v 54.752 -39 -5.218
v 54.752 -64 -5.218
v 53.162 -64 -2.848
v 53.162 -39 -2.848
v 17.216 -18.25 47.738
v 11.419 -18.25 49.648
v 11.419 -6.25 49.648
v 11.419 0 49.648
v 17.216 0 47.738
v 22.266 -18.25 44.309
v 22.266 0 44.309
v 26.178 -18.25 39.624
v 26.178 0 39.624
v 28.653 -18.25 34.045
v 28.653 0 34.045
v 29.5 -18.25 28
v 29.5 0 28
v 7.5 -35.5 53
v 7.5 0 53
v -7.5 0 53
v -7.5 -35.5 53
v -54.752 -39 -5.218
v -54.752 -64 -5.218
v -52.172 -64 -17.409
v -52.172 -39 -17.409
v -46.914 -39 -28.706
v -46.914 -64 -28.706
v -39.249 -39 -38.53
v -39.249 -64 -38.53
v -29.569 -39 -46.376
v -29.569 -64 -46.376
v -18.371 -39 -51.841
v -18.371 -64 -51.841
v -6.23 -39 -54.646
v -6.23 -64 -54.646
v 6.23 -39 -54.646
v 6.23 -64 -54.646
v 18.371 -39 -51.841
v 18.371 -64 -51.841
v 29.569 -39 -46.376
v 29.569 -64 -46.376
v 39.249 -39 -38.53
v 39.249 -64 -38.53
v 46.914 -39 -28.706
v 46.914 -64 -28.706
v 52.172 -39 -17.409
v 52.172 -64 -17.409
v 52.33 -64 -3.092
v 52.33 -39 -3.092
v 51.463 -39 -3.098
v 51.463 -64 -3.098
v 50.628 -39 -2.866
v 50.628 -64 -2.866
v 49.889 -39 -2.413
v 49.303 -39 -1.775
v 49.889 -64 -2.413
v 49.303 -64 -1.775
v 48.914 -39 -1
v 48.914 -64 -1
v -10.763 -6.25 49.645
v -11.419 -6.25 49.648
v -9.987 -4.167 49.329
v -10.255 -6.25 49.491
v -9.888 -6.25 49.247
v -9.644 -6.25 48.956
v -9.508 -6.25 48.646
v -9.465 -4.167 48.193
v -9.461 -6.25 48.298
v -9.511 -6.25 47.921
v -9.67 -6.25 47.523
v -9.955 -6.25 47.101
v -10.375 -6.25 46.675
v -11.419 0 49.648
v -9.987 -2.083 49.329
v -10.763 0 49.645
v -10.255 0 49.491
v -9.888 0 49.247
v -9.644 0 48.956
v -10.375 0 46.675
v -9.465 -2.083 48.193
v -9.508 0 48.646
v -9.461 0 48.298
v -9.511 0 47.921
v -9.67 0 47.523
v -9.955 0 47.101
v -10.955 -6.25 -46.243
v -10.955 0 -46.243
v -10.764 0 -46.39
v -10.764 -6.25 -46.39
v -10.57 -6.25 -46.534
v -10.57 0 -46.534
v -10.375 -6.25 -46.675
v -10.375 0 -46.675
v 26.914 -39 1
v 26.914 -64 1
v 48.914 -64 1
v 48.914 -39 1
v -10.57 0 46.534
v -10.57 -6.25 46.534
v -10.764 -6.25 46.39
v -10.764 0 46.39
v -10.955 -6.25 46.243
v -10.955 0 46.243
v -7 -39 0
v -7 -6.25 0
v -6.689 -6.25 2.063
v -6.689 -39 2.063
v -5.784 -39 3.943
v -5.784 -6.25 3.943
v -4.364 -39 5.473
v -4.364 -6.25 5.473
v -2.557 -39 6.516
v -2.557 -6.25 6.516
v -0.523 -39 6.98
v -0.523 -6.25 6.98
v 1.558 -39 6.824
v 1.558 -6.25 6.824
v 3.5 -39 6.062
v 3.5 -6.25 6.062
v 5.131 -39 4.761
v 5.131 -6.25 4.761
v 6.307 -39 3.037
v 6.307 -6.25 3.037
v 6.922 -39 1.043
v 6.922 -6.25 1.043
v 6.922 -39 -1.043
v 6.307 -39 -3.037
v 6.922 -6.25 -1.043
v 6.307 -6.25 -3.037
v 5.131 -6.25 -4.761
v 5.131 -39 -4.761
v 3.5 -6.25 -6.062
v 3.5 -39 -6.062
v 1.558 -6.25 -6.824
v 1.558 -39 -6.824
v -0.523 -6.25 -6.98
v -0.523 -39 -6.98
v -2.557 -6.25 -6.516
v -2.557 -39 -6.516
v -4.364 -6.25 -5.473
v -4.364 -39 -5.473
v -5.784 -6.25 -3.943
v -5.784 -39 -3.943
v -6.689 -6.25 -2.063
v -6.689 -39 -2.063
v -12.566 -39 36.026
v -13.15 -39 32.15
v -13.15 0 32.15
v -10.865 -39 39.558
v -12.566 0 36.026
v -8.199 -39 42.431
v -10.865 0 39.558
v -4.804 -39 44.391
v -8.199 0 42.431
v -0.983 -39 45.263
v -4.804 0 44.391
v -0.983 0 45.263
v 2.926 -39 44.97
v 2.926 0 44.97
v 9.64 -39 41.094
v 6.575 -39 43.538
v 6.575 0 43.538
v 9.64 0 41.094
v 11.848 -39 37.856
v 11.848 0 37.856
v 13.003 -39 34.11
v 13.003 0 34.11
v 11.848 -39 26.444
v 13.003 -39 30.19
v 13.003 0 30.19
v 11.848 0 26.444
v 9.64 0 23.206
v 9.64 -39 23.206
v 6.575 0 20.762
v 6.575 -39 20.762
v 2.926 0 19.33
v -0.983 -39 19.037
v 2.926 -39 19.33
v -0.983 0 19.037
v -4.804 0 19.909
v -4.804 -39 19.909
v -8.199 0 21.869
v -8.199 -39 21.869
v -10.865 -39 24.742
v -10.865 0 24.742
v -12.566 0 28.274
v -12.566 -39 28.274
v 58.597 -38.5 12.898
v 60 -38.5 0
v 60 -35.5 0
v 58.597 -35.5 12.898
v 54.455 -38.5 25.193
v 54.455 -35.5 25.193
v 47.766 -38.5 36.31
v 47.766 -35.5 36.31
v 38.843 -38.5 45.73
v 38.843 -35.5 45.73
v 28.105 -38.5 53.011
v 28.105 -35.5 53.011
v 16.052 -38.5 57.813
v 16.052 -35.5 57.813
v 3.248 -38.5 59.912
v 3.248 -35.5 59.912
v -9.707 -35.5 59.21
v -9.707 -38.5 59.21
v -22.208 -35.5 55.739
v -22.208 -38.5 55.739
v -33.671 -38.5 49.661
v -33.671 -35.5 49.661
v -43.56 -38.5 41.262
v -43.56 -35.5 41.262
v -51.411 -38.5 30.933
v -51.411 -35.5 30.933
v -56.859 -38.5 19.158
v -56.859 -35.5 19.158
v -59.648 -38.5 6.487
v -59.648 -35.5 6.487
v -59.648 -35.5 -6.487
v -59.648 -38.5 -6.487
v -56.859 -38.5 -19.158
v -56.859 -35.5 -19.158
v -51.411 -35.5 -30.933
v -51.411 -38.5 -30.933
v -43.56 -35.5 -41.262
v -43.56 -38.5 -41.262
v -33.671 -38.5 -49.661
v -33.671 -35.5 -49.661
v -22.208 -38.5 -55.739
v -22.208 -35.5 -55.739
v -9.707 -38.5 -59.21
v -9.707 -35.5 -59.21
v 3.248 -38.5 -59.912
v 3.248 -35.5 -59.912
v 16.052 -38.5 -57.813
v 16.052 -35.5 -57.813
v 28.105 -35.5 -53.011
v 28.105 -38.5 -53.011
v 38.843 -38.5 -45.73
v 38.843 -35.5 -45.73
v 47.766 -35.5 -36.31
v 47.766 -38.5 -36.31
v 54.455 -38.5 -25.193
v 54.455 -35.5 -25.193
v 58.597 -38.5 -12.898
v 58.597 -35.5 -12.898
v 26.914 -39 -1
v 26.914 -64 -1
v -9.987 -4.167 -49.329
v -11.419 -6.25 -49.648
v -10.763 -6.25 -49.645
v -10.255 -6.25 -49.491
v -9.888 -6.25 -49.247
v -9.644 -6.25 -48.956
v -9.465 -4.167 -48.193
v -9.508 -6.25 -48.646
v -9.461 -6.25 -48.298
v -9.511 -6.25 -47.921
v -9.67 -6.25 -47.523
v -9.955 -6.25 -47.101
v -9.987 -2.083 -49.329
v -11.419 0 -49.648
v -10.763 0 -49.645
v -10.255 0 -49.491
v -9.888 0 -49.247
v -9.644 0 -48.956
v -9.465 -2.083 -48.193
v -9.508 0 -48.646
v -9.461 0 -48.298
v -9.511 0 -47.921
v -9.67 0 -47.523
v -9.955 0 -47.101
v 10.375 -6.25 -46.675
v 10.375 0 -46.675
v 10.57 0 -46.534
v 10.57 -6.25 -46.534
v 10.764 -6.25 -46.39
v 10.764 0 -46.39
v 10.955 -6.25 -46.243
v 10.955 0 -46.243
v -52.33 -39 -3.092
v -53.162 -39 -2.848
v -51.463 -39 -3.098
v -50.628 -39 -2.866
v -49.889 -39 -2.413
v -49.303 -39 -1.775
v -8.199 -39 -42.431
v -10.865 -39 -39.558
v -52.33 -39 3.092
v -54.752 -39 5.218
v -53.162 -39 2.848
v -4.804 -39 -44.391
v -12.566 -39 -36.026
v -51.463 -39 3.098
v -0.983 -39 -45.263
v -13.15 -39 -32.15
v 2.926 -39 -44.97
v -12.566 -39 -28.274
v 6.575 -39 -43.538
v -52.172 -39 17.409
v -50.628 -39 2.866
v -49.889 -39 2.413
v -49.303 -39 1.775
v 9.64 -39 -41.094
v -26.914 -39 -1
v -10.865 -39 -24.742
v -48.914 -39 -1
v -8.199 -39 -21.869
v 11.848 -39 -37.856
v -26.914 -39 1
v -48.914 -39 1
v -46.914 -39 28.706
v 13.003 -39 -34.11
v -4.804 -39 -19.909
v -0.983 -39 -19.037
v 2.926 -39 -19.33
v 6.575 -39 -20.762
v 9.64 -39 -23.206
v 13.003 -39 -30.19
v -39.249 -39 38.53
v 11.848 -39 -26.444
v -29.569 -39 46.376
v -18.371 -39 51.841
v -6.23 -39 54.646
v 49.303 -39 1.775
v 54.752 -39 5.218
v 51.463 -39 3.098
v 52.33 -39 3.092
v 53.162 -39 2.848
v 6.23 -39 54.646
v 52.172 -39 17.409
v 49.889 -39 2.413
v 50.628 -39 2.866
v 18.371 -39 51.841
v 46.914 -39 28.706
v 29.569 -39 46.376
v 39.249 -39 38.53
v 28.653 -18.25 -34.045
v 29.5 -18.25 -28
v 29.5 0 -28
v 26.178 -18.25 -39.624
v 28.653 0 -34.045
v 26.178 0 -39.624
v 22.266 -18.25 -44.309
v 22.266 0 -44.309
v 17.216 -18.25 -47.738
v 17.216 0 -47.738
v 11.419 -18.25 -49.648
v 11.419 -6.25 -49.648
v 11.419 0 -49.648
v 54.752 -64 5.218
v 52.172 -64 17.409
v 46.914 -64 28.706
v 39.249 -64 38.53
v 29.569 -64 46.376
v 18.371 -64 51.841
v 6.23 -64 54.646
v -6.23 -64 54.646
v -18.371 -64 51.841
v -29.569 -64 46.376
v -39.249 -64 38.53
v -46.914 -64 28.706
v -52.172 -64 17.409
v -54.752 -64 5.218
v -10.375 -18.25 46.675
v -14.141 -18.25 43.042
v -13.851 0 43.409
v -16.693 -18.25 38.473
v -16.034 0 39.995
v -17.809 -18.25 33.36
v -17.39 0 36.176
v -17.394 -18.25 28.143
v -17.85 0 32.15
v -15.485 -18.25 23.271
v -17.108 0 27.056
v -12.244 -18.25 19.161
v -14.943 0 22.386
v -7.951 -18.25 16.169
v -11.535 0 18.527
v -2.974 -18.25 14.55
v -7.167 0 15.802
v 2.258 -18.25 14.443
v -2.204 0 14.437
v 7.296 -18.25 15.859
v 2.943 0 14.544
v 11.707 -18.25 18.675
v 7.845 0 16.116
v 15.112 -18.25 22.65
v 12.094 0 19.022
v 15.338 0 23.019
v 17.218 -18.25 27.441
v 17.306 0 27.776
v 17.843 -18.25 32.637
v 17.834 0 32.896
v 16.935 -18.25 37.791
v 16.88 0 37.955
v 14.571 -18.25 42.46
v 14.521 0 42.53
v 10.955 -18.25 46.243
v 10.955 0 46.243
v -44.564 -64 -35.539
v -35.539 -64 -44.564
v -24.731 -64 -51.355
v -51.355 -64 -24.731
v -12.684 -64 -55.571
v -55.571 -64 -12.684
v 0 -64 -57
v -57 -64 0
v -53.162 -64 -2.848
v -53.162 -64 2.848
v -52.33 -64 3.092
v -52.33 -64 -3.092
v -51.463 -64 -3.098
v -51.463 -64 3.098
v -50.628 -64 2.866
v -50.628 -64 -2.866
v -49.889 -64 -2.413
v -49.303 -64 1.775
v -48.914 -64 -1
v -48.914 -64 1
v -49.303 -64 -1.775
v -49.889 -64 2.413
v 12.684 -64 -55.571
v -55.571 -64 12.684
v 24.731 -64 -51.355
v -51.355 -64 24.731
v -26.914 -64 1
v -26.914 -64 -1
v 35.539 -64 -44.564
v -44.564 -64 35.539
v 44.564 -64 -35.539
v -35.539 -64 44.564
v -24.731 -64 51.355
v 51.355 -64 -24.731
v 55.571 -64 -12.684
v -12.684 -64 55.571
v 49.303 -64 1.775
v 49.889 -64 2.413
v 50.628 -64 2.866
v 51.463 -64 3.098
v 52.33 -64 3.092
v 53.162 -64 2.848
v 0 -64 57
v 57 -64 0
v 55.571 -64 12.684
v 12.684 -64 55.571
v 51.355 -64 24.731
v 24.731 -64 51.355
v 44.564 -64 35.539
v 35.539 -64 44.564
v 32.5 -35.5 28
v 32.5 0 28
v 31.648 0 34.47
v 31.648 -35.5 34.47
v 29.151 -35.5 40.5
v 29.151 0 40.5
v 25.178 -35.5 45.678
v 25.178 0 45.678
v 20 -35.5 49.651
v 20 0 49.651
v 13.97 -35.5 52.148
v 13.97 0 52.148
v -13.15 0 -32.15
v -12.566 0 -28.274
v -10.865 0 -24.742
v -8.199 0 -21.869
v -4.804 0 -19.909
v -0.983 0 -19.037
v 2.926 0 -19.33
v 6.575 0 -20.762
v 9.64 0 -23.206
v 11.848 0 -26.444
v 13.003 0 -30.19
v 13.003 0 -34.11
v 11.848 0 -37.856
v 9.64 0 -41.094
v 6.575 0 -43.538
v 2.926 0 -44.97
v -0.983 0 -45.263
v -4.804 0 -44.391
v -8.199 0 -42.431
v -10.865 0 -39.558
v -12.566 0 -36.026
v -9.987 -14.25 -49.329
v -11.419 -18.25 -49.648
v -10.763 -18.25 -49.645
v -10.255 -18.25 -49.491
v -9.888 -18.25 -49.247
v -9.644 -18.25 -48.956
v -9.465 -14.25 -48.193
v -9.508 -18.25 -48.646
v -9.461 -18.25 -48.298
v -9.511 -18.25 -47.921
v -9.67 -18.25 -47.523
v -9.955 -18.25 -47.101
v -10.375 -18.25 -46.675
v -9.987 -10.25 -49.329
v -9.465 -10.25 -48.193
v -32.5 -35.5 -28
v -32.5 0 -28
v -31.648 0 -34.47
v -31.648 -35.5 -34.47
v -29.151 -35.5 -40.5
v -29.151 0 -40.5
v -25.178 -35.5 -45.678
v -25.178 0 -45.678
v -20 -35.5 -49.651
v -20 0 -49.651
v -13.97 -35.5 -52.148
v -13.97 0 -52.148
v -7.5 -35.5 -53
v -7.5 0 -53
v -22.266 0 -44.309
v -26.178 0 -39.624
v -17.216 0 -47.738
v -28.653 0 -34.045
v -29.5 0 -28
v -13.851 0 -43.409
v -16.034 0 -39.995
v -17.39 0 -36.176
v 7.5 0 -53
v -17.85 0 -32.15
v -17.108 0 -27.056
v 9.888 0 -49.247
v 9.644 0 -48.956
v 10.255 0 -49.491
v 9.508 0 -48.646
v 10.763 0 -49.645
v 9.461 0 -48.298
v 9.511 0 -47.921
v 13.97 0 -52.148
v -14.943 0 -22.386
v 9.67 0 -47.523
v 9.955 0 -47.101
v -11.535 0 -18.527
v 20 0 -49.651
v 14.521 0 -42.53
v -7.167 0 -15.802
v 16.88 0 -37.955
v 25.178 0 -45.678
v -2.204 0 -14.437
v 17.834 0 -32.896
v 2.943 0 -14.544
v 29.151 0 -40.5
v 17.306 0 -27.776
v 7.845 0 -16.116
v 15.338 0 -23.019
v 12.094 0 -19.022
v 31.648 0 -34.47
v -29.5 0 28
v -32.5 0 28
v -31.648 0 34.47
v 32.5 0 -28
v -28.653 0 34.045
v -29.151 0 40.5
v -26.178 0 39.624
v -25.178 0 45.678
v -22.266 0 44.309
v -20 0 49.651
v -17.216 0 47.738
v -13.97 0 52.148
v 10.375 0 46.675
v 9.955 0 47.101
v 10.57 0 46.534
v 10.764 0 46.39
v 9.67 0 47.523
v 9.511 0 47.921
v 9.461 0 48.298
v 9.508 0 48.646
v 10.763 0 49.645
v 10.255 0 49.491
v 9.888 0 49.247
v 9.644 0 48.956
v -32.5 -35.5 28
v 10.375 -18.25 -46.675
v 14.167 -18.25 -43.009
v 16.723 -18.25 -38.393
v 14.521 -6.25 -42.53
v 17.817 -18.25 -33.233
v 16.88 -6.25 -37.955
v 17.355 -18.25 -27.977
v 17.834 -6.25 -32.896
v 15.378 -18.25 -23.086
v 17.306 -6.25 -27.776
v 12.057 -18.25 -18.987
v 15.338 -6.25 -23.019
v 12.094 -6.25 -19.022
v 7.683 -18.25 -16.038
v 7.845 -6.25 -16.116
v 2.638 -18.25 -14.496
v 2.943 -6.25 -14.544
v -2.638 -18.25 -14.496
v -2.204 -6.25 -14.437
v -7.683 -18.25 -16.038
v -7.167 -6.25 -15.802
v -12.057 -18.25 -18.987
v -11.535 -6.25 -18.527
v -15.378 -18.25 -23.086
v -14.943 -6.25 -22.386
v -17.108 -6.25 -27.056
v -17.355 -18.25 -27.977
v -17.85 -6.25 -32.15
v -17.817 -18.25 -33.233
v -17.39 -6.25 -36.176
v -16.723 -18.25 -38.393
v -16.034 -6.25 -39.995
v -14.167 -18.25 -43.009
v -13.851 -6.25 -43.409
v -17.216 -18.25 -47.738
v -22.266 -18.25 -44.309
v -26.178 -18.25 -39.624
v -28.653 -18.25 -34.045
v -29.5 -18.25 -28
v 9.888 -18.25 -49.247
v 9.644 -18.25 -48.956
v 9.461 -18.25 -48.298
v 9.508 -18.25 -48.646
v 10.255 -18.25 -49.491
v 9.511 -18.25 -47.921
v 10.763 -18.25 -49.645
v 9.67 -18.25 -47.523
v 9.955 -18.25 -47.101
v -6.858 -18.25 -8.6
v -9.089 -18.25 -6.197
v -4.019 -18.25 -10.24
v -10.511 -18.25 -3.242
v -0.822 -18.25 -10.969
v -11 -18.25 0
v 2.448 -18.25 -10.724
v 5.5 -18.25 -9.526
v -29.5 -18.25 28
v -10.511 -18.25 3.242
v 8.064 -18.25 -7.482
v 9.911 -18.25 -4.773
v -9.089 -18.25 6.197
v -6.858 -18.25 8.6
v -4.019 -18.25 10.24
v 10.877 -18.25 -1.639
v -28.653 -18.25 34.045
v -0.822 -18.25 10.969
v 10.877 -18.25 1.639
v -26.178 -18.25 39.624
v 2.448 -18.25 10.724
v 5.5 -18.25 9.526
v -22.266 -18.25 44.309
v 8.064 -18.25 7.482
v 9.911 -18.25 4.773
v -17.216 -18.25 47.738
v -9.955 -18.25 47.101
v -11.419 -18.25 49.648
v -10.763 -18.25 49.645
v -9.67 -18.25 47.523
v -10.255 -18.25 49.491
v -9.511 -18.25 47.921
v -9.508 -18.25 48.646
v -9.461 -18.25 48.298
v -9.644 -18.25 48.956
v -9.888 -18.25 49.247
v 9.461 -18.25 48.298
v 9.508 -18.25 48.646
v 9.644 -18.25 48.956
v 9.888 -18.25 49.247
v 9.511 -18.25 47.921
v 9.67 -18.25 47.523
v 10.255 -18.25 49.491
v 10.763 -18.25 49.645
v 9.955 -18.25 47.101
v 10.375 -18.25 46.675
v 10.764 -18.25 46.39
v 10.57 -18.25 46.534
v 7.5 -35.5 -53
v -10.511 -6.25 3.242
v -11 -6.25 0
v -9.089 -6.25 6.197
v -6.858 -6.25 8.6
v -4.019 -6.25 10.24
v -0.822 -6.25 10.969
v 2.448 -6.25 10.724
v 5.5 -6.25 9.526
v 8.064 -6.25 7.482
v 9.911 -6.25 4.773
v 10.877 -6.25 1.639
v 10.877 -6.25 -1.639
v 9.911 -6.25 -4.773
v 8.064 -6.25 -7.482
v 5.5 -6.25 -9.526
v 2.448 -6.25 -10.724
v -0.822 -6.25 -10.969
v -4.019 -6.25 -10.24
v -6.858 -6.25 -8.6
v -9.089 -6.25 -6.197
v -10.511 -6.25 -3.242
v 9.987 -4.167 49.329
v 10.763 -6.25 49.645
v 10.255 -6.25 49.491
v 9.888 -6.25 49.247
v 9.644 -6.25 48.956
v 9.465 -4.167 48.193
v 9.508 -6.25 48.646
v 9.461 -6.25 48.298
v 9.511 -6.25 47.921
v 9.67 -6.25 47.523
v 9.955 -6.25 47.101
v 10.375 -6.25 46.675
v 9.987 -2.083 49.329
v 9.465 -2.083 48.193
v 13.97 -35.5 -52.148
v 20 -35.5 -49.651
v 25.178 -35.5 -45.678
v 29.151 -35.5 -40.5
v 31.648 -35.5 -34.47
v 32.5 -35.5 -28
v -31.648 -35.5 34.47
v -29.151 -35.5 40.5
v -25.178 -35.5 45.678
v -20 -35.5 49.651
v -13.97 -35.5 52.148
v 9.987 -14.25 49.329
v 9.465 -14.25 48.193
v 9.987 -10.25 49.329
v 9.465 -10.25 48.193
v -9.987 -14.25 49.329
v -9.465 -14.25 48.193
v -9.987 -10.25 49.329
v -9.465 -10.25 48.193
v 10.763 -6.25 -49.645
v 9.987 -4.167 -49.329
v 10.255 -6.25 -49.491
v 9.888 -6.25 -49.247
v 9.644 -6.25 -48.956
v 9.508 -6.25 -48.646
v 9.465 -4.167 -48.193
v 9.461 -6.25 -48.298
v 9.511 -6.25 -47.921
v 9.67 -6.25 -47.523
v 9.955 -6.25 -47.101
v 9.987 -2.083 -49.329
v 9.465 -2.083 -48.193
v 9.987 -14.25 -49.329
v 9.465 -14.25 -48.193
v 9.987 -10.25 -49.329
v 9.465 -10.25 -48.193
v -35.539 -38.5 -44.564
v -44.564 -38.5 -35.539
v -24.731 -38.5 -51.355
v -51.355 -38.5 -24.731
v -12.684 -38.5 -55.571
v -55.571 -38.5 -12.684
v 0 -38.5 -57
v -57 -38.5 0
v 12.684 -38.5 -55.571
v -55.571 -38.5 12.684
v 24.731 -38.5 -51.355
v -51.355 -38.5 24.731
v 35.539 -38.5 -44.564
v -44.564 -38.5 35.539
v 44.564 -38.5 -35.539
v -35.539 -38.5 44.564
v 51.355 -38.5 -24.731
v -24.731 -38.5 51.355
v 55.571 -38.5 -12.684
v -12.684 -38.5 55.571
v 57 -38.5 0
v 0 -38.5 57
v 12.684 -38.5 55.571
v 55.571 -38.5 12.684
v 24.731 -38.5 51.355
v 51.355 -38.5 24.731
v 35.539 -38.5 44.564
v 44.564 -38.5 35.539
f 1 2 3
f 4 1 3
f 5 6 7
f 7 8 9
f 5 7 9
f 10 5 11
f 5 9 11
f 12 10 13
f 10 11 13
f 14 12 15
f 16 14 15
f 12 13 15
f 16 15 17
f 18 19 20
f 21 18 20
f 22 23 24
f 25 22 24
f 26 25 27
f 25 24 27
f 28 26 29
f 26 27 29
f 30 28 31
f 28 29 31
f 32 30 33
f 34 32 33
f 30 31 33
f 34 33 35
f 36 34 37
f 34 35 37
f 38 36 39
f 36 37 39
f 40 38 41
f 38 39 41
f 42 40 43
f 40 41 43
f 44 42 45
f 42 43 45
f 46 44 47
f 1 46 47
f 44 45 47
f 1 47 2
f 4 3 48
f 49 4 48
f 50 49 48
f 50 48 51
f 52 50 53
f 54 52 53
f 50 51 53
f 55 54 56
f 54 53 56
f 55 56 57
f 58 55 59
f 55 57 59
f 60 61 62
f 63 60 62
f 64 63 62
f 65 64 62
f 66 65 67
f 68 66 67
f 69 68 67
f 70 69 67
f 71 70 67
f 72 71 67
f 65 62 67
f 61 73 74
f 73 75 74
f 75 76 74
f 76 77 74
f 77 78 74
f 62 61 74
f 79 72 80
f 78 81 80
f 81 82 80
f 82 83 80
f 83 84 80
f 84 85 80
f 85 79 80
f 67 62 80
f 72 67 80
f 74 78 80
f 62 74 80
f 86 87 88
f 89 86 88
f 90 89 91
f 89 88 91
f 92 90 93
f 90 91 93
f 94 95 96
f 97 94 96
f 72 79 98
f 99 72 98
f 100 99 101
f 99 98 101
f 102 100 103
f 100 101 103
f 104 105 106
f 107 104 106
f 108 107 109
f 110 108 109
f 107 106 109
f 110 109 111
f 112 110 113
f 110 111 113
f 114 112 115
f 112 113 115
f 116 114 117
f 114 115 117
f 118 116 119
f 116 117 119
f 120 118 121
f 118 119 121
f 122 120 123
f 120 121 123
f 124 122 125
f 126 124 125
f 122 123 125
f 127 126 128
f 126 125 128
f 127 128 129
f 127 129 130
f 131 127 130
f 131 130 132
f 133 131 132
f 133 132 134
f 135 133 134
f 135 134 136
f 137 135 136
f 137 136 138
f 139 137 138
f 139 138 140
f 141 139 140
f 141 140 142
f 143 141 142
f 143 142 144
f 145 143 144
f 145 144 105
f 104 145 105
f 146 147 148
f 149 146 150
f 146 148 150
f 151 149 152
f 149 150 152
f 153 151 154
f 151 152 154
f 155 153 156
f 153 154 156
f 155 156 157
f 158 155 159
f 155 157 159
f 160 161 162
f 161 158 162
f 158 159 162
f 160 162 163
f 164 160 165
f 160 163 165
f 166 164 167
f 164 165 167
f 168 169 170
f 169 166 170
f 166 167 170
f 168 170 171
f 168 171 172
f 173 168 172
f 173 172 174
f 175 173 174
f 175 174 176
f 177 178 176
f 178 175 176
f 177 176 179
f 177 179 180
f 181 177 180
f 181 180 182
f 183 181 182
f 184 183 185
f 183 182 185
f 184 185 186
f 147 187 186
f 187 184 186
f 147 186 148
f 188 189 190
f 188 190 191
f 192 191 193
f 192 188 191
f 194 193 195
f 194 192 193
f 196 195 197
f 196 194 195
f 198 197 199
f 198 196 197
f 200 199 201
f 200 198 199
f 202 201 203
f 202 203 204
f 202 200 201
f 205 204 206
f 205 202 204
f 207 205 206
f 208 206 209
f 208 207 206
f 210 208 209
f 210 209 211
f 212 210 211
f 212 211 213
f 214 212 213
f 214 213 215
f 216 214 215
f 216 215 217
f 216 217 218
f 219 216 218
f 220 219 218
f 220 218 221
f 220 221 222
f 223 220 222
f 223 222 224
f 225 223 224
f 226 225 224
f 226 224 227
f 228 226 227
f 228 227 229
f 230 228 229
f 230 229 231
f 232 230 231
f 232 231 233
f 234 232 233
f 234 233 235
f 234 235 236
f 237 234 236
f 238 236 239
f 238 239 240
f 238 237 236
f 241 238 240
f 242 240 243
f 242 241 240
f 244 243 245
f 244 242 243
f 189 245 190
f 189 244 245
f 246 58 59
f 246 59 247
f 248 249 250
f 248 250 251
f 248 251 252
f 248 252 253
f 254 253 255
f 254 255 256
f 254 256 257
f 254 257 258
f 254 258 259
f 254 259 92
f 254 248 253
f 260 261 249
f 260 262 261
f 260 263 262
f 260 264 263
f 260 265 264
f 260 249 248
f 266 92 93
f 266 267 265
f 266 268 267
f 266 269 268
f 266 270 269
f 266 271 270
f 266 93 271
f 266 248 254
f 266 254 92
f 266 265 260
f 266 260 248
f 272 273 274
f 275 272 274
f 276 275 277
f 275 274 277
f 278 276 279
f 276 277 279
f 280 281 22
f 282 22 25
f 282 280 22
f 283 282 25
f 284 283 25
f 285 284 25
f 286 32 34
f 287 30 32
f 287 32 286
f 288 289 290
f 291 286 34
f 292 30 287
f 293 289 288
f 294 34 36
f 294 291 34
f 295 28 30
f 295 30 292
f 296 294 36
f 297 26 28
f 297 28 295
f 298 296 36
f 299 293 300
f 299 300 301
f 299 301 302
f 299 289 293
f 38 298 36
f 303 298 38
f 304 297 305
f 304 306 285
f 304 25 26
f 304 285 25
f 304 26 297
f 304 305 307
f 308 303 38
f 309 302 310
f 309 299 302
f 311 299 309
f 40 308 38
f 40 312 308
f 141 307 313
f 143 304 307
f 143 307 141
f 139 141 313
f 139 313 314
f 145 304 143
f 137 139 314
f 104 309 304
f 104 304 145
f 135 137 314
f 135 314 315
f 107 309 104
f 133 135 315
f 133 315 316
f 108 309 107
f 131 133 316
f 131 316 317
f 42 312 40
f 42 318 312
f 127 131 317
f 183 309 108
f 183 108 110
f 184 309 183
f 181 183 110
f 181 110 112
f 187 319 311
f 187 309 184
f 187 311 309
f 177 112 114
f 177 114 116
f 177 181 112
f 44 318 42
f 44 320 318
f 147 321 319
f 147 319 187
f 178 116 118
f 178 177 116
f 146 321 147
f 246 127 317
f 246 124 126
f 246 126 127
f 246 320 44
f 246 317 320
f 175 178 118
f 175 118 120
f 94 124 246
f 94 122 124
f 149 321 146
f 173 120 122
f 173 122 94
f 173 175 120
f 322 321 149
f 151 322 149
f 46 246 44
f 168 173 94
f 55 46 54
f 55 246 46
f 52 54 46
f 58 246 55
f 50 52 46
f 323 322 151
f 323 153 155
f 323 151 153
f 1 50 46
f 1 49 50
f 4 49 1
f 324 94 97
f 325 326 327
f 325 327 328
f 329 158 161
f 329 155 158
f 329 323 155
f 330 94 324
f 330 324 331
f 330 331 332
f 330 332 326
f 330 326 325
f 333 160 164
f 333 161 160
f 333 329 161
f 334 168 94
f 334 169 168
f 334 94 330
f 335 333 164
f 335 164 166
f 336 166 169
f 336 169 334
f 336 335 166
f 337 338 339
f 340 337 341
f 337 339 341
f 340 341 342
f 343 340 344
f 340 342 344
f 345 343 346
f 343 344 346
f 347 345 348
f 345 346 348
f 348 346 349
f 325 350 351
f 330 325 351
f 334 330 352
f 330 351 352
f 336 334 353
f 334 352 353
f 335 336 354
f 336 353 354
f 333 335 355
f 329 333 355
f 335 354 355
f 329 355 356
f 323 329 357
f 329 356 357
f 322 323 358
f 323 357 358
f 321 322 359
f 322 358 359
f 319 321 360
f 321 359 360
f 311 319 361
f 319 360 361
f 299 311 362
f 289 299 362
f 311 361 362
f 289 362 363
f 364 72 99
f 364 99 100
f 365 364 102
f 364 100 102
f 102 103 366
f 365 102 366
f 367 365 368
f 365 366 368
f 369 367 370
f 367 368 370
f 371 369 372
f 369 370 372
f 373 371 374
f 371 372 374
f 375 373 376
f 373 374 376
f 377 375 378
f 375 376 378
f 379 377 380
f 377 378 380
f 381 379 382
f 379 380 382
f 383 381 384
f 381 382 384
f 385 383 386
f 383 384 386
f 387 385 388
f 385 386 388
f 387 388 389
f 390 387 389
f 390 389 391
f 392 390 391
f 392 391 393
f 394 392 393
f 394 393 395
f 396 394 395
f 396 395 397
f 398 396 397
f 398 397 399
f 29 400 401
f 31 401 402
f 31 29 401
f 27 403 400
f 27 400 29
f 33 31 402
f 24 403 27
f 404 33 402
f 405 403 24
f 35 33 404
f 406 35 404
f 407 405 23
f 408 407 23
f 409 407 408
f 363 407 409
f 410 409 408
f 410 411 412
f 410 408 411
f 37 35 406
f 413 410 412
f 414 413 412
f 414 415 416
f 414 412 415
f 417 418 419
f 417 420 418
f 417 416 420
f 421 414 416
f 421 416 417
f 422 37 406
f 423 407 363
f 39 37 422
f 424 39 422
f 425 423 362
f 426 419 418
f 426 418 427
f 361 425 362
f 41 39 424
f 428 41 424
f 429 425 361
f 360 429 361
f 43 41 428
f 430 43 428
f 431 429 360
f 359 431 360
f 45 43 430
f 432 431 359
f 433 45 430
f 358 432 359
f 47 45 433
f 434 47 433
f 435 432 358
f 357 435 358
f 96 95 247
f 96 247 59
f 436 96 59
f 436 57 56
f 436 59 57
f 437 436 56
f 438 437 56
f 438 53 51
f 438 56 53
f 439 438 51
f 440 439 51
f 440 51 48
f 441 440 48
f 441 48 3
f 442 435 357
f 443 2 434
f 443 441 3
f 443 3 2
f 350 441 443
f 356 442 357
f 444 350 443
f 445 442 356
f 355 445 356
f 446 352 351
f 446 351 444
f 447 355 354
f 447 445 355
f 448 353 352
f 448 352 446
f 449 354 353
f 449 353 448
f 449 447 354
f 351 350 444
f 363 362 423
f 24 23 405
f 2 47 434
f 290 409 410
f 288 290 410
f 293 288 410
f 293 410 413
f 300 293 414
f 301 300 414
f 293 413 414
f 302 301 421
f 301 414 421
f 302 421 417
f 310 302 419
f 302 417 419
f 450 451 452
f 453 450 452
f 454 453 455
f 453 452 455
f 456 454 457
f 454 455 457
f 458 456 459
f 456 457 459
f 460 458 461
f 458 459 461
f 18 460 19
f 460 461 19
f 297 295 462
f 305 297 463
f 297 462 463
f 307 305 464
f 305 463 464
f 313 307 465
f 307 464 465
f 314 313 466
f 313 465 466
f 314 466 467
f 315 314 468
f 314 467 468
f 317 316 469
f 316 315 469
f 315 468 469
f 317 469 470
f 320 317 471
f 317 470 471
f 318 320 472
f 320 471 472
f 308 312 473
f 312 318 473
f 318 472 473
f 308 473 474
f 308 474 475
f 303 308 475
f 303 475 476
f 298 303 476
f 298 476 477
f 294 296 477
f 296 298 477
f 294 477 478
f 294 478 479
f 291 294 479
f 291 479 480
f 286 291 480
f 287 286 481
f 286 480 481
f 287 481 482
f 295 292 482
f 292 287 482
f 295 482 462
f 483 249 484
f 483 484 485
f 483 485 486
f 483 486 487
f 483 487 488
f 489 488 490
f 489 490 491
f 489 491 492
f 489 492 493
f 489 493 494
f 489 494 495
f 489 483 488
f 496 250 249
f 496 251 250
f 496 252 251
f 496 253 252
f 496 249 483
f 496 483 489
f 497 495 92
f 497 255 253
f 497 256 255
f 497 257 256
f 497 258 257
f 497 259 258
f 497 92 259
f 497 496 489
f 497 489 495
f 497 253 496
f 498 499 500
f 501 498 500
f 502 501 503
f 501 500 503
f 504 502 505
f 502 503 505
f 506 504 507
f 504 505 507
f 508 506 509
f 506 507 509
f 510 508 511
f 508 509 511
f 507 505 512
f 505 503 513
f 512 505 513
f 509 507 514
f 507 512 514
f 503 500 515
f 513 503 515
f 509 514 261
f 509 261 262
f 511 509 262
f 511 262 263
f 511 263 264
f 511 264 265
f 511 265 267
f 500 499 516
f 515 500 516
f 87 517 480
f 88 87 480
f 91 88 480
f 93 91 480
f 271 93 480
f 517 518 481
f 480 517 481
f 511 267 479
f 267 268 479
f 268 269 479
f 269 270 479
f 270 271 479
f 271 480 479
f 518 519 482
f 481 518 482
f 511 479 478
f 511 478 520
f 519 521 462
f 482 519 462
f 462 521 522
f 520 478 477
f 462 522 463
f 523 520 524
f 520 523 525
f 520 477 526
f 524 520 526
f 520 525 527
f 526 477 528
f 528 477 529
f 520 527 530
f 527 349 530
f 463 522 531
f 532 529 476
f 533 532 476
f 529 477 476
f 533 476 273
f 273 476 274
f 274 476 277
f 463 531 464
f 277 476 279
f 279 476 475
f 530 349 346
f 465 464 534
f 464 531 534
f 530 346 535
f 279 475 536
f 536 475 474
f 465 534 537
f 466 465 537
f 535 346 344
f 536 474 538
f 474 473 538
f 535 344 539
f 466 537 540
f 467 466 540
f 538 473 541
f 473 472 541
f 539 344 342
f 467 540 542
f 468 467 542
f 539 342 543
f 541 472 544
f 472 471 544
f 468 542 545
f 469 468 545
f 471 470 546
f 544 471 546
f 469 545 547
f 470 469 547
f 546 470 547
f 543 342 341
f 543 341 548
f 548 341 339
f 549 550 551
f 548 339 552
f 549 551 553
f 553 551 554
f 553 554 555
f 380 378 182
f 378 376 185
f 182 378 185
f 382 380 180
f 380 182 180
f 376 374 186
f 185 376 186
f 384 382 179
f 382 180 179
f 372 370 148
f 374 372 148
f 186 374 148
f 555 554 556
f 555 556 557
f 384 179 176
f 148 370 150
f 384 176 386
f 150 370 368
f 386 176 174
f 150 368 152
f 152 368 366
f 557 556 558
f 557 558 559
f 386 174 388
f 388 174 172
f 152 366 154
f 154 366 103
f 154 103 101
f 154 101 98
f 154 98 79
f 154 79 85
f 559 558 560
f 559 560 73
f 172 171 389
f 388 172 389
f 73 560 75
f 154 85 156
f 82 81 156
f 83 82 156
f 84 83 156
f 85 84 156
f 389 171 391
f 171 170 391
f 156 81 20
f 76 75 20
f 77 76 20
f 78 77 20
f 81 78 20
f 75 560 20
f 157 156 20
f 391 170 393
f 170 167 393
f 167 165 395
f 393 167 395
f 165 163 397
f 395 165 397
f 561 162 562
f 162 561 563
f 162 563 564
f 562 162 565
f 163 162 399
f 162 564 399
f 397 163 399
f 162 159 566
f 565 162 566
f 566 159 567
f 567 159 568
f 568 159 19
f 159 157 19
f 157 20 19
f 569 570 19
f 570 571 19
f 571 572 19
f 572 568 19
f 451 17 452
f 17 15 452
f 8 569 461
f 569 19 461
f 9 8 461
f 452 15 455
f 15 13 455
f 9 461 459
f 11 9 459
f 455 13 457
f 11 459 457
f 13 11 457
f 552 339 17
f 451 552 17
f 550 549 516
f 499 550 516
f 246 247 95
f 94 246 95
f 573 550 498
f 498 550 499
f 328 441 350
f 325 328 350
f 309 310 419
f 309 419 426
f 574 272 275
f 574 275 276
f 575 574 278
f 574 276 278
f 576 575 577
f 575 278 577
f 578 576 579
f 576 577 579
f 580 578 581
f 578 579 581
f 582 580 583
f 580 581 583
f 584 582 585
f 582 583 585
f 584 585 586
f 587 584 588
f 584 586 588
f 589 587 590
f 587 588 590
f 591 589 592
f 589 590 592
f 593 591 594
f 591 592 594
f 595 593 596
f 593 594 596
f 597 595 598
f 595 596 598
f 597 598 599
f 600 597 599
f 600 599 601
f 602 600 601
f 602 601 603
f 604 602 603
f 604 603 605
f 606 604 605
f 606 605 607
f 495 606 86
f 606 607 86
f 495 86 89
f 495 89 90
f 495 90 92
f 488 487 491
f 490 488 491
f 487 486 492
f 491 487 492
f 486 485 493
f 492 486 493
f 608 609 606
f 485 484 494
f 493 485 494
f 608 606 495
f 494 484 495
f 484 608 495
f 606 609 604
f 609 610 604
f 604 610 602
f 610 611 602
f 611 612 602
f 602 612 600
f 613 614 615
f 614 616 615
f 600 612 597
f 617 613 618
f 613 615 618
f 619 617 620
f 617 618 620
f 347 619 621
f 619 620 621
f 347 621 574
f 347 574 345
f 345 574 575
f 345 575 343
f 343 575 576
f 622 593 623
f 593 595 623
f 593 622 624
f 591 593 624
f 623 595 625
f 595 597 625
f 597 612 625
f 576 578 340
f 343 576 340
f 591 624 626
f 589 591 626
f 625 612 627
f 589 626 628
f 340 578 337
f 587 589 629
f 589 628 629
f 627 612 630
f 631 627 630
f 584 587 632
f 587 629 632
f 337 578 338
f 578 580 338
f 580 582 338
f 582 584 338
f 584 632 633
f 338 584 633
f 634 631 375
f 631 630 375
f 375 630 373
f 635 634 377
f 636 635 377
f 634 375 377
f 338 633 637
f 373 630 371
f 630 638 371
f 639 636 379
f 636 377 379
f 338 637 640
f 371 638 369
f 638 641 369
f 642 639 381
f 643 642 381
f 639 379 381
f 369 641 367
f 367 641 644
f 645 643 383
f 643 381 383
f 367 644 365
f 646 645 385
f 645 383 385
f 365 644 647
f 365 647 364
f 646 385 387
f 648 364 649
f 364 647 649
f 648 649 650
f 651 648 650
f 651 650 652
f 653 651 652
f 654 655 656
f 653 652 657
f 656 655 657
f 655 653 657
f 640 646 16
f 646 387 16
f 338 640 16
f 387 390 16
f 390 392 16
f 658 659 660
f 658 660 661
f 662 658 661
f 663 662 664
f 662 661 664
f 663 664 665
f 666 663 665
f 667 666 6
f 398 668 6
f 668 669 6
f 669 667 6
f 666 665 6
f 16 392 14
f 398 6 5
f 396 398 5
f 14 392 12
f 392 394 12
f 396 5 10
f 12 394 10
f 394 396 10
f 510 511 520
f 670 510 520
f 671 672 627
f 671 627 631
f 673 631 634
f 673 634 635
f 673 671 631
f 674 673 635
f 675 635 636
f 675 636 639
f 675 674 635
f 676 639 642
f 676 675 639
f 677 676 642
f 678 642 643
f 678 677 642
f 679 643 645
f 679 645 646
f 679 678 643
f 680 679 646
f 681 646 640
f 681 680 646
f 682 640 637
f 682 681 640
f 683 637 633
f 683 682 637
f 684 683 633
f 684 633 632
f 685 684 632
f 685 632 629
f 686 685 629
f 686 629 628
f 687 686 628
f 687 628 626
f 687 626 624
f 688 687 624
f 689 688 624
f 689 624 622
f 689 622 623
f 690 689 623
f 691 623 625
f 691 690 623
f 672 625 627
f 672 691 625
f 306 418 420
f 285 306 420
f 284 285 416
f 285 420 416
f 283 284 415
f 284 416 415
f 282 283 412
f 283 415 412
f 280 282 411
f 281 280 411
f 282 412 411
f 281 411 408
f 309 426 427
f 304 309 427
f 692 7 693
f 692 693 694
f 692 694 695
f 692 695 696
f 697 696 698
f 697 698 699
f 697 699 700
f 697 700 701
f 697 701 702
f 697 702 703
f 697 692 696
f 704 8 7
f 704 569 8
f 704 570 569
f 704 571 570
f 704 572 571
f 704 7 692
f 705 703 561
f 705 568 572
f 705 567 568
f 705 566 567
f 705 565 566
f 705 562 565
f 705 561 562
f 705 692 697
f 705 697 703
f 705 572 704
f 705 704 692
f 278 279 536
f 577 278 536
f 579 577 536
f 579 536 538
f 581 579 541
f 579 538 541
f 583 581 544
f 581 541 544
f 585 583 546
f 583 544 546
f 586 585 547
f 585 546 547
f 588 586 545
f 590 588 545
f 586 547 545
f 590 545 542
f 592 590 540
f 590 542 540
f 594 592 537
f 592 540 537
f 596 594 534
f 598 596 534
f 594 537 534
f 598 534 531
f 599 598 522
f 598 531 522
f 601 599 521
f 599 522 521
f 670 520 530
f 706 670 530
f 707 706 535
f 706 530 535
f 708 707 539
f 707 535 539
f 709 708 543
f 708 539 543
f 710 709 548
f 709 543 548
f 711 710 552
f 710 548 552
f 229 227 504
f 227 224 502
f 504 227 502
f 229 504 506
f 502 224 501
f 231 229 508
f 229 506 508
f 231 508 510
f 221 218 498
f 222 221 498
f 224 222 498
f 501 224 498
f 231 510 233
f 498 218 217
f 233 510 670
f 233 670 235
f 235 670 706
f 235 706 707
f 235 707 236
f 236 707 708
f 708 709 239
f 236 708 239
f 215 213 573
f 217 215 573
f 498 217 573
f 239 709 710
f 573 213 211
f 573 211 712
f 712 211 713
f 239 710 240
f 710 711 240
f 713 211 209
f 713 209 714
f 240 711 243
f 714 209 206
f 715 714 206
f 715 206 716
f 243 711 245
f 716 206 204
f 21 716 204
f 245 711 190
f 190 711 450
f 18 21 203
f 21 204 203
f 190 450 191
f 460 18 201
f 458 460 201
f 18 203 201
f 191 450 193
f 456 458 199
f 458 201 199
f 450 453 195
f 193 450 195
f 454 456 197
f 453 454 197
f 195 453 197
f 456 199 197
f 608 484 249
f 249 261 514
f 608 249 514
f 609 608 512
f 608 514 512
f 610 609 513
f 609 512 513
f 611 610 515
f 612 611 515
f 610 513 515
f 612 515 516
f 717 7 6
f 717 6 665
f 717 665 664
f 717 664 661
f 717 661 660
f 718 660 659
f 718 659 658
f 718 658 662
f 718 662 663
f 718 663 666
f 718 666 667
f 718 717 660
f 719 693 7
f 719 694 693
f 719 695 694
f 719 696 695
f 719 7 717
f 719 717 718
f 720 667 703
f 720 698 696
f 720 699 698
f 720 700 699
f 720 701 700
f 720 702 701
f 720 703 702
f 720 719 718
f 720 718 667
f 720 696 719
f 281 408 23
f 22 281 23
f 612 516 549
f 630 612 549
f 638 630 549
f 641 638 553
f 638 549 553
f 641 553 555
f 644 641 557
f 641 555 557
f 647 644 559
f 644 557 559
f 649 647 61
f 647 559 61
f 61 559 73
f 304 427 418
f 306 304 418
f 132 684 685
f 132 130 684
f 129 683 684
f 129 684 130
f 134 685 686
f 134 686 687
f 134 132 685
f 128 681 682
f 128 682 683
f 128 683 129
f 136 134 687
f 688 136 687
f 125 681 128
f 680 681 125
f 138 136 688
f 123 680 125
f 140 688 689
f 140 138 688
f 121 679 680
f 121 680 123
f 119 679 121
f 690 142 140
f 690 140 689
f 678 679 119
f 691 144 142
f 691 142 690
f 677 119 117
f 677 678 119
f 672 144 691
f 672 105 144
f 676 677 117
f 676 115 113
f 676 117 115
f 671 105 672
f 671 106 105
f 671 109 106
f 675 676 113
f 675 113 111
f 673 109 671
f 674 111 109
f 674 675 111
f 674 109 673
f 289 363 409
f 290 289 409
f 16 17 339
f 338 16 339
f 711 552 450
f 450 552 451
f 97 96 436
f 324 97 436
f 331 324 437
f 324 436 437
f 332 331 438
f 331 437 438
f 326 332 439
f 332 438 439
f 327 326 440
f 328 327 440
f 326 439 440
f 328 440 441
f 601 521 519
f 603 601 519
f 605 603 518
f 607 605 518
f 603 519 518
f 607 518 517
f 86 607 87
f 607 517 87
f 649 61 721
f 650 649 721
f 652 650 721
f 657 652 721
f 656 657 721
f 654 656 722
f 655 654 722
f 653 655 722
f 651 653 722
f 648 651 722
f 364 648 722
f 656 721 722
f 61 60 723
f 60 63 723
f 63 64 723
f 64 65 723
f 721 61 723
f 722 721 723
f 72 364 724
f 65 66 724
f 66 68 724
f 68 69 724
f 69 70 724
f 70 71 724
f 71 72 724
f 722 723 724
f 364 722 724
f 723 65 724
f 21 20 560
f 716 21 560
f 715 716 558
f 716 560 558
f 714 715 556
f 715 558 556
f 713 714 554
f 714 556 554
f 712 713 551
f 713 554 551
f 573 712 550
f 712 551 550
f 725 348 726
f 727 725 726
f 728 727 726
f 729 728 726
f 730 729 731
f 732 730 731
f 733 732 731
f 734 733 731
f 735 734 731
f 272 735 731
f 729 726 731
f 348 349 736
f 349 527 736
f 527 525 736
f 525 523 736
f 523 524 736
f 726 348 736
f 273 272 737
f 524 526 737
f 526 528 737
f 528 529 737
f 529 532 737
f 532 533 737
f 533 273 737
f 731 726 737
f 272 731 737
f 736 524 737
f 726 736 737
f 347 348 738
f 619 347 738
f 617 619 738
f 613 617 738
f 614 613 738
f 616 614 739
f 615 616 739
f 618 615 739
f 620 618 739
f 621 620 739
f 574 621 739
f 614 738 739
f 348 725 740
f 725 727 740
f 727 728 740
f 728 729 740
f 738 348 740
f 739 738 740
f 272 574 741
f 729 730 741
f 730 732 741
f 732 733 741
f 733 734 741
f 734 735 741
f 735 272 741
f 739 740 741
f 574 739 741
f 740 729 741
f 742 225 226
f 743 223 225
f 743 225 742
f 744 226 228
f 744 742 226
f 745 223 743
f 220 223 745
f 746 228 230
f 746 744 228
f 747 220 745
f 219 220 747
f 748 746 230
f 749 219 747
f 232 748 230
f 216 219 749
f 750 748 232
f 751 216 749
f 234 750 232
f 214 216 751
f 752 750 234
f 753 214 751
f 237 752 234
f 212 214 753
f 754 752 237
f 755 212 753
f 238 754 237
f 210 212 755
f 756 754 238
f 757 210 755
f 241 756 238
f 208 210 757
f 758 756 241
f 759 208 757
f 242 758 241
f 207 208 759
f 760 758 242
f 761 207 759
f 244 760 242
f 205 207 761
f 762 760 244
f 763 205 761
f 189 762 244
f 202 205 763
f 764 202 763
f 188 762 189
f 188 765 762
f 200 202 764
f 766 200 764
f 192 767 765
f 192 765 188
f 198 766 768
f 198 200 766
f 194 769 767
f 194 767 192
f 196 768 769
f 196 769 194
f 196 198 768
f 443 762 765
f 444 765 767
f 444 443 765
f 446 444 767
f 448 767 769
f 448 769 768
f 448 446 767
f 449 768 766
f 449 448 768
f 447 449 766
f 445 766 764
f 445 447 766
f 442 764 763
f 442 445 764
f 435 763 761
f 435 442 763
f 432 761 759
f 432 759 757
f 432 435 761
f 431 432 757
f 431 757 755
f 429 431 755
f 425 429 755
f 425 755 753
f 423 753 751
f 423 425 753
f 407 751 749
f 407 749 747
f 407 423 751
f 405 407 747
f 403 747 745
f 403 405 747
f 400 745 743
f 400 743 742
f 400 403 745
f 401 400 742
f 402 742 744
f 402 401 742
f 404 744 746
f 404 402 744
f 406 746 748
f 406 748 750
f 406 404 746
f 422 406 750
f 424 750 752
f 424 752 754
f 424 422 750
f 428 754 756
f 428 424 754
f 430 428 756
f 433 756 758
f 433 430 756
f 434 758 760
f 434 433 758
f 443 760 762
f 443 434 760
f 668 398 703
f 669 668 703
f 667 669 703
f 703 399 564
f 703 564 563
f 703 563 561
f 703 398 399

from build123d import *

# Parameters (mm, degrees)
F1_DEPTH  = 64
F2_R      = 60
F3_DEPTH  = 28.5
F4_R      = 60
F4_R_2    = 57
F5_DEPTH  = 25.5
F7_DEPTH  = 6.25
F8_R      = 13.15
F9_DEPTH  = 64.001
F10_R     = 11
F11_DEPTH = 12
F12_R     = 13.15
F13_DEPTH = 25
F14_R     = 7
F15_DEPTH = 57.751


with BuildPart() as f1:
    # F0 (on Front) → F1 (new body)
    with BuildSketch(Plane.XZ):
        with BuildLine():
            ThreePointArc((-32.5, -28), (-25.1776695297, -45.6776695297), (-7.5, -53))
            Line((-7.5, -53), (7.5, -53))
            ThreePointArc((7.5, -53), (25.1776695297, -45.6776695297), (32.5, -28))
            Line((32.5, -28), (32.5, 28))
            ThreePointArc((32.5, 28), (25.1776695297, 45.6776695297), (7.5, 53))
            Line((7.5, 53), (-7.5, 53))
            ThreePointArc((-7.5, 53), (-25.1776695297, 45.6776695297), (-32.5, 28))
            Line((-32.5, 28), (-32.5, -28))
        make_face()
    extrude(amount=F1_DEPTH)

    # F2 (on face) → F3 (join)
    with BuildSketch(Plane.XZ.offset(64)):
        Circle(F2_R)
    extrude(amount=-F3_DEPTH)

    # F4 (on face) → F5 (cut)
    with BuildSketch(Plane.XZ.offset(64)):
        Circle(F4_R)
        Circle(F4_R_2, mode=Mode.SUBTRACT)
    extrude(amount=-F5_DEPTH, mode=Mode.SUBTRACT)

    # F6 (on face) → F7 (cut)
    with BuildSketch(Plane(origin=(0, 0, 0), x_dir=(-1, 0, 0), z_dir=(0, 1, 0))):
        with BuildLine():
            ThreePointArc((10.955166333, 46.2427935703), (16.0339049992, 39.9945133997), (17.85, 32.15))
            ThreePointArc((17.85, 32.15), (-7.8445133997, 16.1160950008), (-10.955166333, 46.2427935703))
            ThreePointArc((-10.955166333, 46.2427935703), (-10.6670838439, 46.4620865798), (-10.3746129282, 46.6754916127))
            add(Edge.make_bspline(
                [(-11.4193501695, 49.6480644458), (-9.7061666222, 49.8827470388), (-8.574372674, 48.2387921733), (-10.3746129282, 46.6754916127)],
                knots=[0, 0, 0, 0, 3.1442100344, 3.1442100344, 3.1442100344, 3.1442100344], degree=3))
            ThreePointArc((-11.4193501695, 49.6480644458), (-24.3852850691, 42.1027354841), (-29.5, 28))
            Line((-29.5, 28), (-29.5, -28))
            ThreePointArc((-29.5, -28), (-24.3852850691, -42.1027354841), (-11.4193501695, -49.6480644458))
            add(Edge.make_bspline(
                [(-11.4193501695, -49.6480644458), (-9.7061666222, -49.8827470388), (-8.574372674, -48.2387921733), (-10.3746129282, -46.6754916127)],
                knots=[0, 0, 0, 0, 3.1442100344, 3.1442100344, 3.1442100344, 3.1442100344], degree=3))
            ThreePointArc((-10.3746129282, -46.6754916127), (-10.6670838439, -46.4620865798), (-10.955166333, -46.2427935703))
            ThreePointArc((-10.955166333, -46.2427935703), (-7.8445133997, -16.1160950008), (17.85, -32.15))
            ThreePointArc((17.85, -32.15), (16.0339049992, -39.9945133997), (10.955166333, -46.2427935703))
            ThreePointArc((10.955166333, -46.2427935703), (10.6670838439, -46.4620865798), (10.3746129282, -46.6754916127))
            add(Edge.make_bspline(
                [(11.4193501695, -49.6480644458), (9.7061666222, -49.8827470388), (8.574372674, -48.2387921733), (10.3746129282, -46.6754916127)],
                knots=[0, 0, 0, 0, 3.1442100344, 3.1442100344, 3.1442100344, 3.1442100344], degree=3))
            ThreePointArc((11.4193501695, -49.6480644458), (24.3852850691, -42.1027354841), (29.5, -28))
            Line((29.5, -28), (29.5, 28))
            ThreePointArc((29.5, 28), (24.3852850691, 42.1027354841), (11.4193501695, 49.6480644458))
            add(Edge.make_bspline(
                [(11.4193501695, 49.6480644458), (9.7061666222, 49.8827470388), (8.574372674, 48.2387921733), (10.3746129282, 46.6754916127)],
                knots=[0, 0, 0, 0, 3.1442100344, 3.1442100344, 3.1442100344, 3.1442100344], degree=3))
            ThreePointArc((10.3746129282, 46.6754916127), (10.6670838439, 46.4620865798), (10.955166333, 46.2427935703))
        make_face()
    extrude(amount=-F7_DEPTH, mode=Mode.SUBTRACT)

    # F8 (on face) → F9 (cut, through all)
    with BuildSketch(Plane(origin=(0, 0, 0), x_dir=(-1, 0, 0), z_dir=(0, 1, 0))):
        with Locations((0, 32.15)):
            Circle(F8_R)
        with Locations((0, -32.15)):
            Circle(F8_R)
    extrude(amount=-F9_DEPTH, mode=Mode.SUBTRACT)

    # F10 (on face) → F11 (cut)
    with BuildSketch(Plane(origin=(0, -6.25, 0), x_dir=(-1, 0, 0), z_dir=(0, 1, 0))):
        with BuildLine():
            add(Edge.make_bspline(
                [(11.4193501695, -49.6480644458), (9.7061666222, -49.8827470388), (8.574372674, -48.2387921733), (10.3746129282, -46.6754916127)],
                knots=[0, 0, 0, 0, 3.1442100344, 3.1442100344, 3.1442100344, 3.1442100344], degree=3))
            ThreePointArc((11.4193501695, -49.6480644458), (24.3852850691, -42.1027354841), (29.5, -28))
            Line((29.5, -28), (29.5, 28))
            ThreePointArc((29.5, 28), (24.3852850691, 42.1027354841), (11.4193501695, 49.6480644458))
            add(Edge.make_bspline(
                [(11.4193501695, 49.6480644458), (9.7061666222, 49.8827470388), (8.574372674, 48.2387921733), (10.3746129282, 46.6754916127)],
                knots=[0, 0, 0, 0, 3.1442100344, 3.1442100344, 3.1442100344, 3.1442100344], degree=3))
            ThreePointArc((10.3746129282, 46.6754916127), (0.3620324059, 14.3036717351), (-10.955166333, 46.2427935703))
            ThreePointArc((-10.955166333, 46.2427935703), (-10.6670838439, 46.4620865798), (-10.3746129282, 46.6754916127))
            add(Edge.make_bspline(
                [(-11.4193501695, 49.6480644458), (-9.7061666222, 49.8827470388), (-8.574372674, 48.2387921733), (-10.3746129282, 46.6754916127)],
                knots=[0, 0, 0, 0, 3.1442100344, 3.1442100344, 3.1442100344, 3.1442100344], degree=3))
            ThreePointArc((-11.4193501695, 49.6480644458), (-24.3852850691, 42.1027354841), (-29.5, 28))
            Line((-29.5, 28), (-29.5, -28))
            ThreePointArc((-29.5, -28), (-24.3852850691, -42.1027354841), (-11.4193501695, -49.6480644458))
            add(Edge.make_bspline(
                [(-11.4193501695, -49.6480644458), (-9.7061666222, -49.8827470388), (-8.574372674, -48.2387921733), (-10.3746129282, -46.6754916127)],
                knots=[0, 0, 0, 0, 3.1442100344, 3.1442100344, 3.1442100344, 3.1442100344], degree=3))
            ThreePointArc((-10.3746129282, -46.6754916127), (0, -14.3), (10.3746129282, -46.6754916127))
        make_face()
        Circle(F10_R, mode=Mode.SUBTRACT)
    extrude(amount=-F11_DEPTH, mode=Mode.SUBTRACT)

    # F12 (on face) → F13 (cut)
    with BuildSketch(Plane.XZ.offset(64)):
        with BuildLine():
            ThreePointArc((-53.1616791792, 2.8478205157), (-50.6283325618, 2.8655619516), (-48.9143201794, 1))
            Line((-48.9143201794, 1), (-26.9143201794, 1))
            Line((-26.9143201794, 1), (-26.9143201794, -1))
            Line((-26.9143201794, -1), (-48.9143201794, -1))
            ThreePointArc((-48.9143201794, -1), (-50.6283325618, -2.8655619516), (-53.1616791792, -2.8478205157))
            Line((-53.1616791792, -2.8478205157), (-54.7518743997, -5.2184528093))
            ThreePointArc((-54.7518743997, -5.2184528093), (0, -55), (54.7518743997, -5.2184528093))
            Line((54.7518743997, -5.2184528093), (53.1616791792, -2.8478205157))
            ThreePointArc((53.1616791792, -2.8478205157), (50.6283325618, -2.8655619516), (48.9143201794, -1))
            Line((48.9143201794, -1), (26.9143201794, -1))
            Line((26.9143201794, -1), (26.9143201794, 1))
            Line((26.9143201794, 1), (48.9143201794, 1))
            ThreePointArc((48.9143201794, 1), (50.6283325618, 2.8655619516), (53.1616791792, 2.8478205157))
            Line((53.1616791792, 2.8478205157), (54.7518743997, 5.2184528093))
            ThreePointArc((54.7518743997, 5.2184528093), (0, 55), (-54.7518743997, 5.2184528093))
            Line((-54.7518743997, 5.2184528093), (-53.1616791792, 2.8478205157))
        make_face()
        with Locations((0, -32.15)):
            Circle(F12_R, mode=Mode.SUBTRACT)
        with Locations((0, 32.15)):
            Circle(F12_R, mode=Mode.SUBTRACT)
    extrude(amount=-F13_DEPTH, mode=Mode.SUBTRACT)

    # F14 (on face) → F15 (cut, through all)
    with BuildSketch(Plane(origin=(0, -6.25, 0), x_dir=(-1, 0, 0), z_dir=(0, 1, 0))):
        Circle(F14_R)
    extrude(amount=-F15_DEPTH, mode=Mode.SUBTRACT)


solid = f1.part
